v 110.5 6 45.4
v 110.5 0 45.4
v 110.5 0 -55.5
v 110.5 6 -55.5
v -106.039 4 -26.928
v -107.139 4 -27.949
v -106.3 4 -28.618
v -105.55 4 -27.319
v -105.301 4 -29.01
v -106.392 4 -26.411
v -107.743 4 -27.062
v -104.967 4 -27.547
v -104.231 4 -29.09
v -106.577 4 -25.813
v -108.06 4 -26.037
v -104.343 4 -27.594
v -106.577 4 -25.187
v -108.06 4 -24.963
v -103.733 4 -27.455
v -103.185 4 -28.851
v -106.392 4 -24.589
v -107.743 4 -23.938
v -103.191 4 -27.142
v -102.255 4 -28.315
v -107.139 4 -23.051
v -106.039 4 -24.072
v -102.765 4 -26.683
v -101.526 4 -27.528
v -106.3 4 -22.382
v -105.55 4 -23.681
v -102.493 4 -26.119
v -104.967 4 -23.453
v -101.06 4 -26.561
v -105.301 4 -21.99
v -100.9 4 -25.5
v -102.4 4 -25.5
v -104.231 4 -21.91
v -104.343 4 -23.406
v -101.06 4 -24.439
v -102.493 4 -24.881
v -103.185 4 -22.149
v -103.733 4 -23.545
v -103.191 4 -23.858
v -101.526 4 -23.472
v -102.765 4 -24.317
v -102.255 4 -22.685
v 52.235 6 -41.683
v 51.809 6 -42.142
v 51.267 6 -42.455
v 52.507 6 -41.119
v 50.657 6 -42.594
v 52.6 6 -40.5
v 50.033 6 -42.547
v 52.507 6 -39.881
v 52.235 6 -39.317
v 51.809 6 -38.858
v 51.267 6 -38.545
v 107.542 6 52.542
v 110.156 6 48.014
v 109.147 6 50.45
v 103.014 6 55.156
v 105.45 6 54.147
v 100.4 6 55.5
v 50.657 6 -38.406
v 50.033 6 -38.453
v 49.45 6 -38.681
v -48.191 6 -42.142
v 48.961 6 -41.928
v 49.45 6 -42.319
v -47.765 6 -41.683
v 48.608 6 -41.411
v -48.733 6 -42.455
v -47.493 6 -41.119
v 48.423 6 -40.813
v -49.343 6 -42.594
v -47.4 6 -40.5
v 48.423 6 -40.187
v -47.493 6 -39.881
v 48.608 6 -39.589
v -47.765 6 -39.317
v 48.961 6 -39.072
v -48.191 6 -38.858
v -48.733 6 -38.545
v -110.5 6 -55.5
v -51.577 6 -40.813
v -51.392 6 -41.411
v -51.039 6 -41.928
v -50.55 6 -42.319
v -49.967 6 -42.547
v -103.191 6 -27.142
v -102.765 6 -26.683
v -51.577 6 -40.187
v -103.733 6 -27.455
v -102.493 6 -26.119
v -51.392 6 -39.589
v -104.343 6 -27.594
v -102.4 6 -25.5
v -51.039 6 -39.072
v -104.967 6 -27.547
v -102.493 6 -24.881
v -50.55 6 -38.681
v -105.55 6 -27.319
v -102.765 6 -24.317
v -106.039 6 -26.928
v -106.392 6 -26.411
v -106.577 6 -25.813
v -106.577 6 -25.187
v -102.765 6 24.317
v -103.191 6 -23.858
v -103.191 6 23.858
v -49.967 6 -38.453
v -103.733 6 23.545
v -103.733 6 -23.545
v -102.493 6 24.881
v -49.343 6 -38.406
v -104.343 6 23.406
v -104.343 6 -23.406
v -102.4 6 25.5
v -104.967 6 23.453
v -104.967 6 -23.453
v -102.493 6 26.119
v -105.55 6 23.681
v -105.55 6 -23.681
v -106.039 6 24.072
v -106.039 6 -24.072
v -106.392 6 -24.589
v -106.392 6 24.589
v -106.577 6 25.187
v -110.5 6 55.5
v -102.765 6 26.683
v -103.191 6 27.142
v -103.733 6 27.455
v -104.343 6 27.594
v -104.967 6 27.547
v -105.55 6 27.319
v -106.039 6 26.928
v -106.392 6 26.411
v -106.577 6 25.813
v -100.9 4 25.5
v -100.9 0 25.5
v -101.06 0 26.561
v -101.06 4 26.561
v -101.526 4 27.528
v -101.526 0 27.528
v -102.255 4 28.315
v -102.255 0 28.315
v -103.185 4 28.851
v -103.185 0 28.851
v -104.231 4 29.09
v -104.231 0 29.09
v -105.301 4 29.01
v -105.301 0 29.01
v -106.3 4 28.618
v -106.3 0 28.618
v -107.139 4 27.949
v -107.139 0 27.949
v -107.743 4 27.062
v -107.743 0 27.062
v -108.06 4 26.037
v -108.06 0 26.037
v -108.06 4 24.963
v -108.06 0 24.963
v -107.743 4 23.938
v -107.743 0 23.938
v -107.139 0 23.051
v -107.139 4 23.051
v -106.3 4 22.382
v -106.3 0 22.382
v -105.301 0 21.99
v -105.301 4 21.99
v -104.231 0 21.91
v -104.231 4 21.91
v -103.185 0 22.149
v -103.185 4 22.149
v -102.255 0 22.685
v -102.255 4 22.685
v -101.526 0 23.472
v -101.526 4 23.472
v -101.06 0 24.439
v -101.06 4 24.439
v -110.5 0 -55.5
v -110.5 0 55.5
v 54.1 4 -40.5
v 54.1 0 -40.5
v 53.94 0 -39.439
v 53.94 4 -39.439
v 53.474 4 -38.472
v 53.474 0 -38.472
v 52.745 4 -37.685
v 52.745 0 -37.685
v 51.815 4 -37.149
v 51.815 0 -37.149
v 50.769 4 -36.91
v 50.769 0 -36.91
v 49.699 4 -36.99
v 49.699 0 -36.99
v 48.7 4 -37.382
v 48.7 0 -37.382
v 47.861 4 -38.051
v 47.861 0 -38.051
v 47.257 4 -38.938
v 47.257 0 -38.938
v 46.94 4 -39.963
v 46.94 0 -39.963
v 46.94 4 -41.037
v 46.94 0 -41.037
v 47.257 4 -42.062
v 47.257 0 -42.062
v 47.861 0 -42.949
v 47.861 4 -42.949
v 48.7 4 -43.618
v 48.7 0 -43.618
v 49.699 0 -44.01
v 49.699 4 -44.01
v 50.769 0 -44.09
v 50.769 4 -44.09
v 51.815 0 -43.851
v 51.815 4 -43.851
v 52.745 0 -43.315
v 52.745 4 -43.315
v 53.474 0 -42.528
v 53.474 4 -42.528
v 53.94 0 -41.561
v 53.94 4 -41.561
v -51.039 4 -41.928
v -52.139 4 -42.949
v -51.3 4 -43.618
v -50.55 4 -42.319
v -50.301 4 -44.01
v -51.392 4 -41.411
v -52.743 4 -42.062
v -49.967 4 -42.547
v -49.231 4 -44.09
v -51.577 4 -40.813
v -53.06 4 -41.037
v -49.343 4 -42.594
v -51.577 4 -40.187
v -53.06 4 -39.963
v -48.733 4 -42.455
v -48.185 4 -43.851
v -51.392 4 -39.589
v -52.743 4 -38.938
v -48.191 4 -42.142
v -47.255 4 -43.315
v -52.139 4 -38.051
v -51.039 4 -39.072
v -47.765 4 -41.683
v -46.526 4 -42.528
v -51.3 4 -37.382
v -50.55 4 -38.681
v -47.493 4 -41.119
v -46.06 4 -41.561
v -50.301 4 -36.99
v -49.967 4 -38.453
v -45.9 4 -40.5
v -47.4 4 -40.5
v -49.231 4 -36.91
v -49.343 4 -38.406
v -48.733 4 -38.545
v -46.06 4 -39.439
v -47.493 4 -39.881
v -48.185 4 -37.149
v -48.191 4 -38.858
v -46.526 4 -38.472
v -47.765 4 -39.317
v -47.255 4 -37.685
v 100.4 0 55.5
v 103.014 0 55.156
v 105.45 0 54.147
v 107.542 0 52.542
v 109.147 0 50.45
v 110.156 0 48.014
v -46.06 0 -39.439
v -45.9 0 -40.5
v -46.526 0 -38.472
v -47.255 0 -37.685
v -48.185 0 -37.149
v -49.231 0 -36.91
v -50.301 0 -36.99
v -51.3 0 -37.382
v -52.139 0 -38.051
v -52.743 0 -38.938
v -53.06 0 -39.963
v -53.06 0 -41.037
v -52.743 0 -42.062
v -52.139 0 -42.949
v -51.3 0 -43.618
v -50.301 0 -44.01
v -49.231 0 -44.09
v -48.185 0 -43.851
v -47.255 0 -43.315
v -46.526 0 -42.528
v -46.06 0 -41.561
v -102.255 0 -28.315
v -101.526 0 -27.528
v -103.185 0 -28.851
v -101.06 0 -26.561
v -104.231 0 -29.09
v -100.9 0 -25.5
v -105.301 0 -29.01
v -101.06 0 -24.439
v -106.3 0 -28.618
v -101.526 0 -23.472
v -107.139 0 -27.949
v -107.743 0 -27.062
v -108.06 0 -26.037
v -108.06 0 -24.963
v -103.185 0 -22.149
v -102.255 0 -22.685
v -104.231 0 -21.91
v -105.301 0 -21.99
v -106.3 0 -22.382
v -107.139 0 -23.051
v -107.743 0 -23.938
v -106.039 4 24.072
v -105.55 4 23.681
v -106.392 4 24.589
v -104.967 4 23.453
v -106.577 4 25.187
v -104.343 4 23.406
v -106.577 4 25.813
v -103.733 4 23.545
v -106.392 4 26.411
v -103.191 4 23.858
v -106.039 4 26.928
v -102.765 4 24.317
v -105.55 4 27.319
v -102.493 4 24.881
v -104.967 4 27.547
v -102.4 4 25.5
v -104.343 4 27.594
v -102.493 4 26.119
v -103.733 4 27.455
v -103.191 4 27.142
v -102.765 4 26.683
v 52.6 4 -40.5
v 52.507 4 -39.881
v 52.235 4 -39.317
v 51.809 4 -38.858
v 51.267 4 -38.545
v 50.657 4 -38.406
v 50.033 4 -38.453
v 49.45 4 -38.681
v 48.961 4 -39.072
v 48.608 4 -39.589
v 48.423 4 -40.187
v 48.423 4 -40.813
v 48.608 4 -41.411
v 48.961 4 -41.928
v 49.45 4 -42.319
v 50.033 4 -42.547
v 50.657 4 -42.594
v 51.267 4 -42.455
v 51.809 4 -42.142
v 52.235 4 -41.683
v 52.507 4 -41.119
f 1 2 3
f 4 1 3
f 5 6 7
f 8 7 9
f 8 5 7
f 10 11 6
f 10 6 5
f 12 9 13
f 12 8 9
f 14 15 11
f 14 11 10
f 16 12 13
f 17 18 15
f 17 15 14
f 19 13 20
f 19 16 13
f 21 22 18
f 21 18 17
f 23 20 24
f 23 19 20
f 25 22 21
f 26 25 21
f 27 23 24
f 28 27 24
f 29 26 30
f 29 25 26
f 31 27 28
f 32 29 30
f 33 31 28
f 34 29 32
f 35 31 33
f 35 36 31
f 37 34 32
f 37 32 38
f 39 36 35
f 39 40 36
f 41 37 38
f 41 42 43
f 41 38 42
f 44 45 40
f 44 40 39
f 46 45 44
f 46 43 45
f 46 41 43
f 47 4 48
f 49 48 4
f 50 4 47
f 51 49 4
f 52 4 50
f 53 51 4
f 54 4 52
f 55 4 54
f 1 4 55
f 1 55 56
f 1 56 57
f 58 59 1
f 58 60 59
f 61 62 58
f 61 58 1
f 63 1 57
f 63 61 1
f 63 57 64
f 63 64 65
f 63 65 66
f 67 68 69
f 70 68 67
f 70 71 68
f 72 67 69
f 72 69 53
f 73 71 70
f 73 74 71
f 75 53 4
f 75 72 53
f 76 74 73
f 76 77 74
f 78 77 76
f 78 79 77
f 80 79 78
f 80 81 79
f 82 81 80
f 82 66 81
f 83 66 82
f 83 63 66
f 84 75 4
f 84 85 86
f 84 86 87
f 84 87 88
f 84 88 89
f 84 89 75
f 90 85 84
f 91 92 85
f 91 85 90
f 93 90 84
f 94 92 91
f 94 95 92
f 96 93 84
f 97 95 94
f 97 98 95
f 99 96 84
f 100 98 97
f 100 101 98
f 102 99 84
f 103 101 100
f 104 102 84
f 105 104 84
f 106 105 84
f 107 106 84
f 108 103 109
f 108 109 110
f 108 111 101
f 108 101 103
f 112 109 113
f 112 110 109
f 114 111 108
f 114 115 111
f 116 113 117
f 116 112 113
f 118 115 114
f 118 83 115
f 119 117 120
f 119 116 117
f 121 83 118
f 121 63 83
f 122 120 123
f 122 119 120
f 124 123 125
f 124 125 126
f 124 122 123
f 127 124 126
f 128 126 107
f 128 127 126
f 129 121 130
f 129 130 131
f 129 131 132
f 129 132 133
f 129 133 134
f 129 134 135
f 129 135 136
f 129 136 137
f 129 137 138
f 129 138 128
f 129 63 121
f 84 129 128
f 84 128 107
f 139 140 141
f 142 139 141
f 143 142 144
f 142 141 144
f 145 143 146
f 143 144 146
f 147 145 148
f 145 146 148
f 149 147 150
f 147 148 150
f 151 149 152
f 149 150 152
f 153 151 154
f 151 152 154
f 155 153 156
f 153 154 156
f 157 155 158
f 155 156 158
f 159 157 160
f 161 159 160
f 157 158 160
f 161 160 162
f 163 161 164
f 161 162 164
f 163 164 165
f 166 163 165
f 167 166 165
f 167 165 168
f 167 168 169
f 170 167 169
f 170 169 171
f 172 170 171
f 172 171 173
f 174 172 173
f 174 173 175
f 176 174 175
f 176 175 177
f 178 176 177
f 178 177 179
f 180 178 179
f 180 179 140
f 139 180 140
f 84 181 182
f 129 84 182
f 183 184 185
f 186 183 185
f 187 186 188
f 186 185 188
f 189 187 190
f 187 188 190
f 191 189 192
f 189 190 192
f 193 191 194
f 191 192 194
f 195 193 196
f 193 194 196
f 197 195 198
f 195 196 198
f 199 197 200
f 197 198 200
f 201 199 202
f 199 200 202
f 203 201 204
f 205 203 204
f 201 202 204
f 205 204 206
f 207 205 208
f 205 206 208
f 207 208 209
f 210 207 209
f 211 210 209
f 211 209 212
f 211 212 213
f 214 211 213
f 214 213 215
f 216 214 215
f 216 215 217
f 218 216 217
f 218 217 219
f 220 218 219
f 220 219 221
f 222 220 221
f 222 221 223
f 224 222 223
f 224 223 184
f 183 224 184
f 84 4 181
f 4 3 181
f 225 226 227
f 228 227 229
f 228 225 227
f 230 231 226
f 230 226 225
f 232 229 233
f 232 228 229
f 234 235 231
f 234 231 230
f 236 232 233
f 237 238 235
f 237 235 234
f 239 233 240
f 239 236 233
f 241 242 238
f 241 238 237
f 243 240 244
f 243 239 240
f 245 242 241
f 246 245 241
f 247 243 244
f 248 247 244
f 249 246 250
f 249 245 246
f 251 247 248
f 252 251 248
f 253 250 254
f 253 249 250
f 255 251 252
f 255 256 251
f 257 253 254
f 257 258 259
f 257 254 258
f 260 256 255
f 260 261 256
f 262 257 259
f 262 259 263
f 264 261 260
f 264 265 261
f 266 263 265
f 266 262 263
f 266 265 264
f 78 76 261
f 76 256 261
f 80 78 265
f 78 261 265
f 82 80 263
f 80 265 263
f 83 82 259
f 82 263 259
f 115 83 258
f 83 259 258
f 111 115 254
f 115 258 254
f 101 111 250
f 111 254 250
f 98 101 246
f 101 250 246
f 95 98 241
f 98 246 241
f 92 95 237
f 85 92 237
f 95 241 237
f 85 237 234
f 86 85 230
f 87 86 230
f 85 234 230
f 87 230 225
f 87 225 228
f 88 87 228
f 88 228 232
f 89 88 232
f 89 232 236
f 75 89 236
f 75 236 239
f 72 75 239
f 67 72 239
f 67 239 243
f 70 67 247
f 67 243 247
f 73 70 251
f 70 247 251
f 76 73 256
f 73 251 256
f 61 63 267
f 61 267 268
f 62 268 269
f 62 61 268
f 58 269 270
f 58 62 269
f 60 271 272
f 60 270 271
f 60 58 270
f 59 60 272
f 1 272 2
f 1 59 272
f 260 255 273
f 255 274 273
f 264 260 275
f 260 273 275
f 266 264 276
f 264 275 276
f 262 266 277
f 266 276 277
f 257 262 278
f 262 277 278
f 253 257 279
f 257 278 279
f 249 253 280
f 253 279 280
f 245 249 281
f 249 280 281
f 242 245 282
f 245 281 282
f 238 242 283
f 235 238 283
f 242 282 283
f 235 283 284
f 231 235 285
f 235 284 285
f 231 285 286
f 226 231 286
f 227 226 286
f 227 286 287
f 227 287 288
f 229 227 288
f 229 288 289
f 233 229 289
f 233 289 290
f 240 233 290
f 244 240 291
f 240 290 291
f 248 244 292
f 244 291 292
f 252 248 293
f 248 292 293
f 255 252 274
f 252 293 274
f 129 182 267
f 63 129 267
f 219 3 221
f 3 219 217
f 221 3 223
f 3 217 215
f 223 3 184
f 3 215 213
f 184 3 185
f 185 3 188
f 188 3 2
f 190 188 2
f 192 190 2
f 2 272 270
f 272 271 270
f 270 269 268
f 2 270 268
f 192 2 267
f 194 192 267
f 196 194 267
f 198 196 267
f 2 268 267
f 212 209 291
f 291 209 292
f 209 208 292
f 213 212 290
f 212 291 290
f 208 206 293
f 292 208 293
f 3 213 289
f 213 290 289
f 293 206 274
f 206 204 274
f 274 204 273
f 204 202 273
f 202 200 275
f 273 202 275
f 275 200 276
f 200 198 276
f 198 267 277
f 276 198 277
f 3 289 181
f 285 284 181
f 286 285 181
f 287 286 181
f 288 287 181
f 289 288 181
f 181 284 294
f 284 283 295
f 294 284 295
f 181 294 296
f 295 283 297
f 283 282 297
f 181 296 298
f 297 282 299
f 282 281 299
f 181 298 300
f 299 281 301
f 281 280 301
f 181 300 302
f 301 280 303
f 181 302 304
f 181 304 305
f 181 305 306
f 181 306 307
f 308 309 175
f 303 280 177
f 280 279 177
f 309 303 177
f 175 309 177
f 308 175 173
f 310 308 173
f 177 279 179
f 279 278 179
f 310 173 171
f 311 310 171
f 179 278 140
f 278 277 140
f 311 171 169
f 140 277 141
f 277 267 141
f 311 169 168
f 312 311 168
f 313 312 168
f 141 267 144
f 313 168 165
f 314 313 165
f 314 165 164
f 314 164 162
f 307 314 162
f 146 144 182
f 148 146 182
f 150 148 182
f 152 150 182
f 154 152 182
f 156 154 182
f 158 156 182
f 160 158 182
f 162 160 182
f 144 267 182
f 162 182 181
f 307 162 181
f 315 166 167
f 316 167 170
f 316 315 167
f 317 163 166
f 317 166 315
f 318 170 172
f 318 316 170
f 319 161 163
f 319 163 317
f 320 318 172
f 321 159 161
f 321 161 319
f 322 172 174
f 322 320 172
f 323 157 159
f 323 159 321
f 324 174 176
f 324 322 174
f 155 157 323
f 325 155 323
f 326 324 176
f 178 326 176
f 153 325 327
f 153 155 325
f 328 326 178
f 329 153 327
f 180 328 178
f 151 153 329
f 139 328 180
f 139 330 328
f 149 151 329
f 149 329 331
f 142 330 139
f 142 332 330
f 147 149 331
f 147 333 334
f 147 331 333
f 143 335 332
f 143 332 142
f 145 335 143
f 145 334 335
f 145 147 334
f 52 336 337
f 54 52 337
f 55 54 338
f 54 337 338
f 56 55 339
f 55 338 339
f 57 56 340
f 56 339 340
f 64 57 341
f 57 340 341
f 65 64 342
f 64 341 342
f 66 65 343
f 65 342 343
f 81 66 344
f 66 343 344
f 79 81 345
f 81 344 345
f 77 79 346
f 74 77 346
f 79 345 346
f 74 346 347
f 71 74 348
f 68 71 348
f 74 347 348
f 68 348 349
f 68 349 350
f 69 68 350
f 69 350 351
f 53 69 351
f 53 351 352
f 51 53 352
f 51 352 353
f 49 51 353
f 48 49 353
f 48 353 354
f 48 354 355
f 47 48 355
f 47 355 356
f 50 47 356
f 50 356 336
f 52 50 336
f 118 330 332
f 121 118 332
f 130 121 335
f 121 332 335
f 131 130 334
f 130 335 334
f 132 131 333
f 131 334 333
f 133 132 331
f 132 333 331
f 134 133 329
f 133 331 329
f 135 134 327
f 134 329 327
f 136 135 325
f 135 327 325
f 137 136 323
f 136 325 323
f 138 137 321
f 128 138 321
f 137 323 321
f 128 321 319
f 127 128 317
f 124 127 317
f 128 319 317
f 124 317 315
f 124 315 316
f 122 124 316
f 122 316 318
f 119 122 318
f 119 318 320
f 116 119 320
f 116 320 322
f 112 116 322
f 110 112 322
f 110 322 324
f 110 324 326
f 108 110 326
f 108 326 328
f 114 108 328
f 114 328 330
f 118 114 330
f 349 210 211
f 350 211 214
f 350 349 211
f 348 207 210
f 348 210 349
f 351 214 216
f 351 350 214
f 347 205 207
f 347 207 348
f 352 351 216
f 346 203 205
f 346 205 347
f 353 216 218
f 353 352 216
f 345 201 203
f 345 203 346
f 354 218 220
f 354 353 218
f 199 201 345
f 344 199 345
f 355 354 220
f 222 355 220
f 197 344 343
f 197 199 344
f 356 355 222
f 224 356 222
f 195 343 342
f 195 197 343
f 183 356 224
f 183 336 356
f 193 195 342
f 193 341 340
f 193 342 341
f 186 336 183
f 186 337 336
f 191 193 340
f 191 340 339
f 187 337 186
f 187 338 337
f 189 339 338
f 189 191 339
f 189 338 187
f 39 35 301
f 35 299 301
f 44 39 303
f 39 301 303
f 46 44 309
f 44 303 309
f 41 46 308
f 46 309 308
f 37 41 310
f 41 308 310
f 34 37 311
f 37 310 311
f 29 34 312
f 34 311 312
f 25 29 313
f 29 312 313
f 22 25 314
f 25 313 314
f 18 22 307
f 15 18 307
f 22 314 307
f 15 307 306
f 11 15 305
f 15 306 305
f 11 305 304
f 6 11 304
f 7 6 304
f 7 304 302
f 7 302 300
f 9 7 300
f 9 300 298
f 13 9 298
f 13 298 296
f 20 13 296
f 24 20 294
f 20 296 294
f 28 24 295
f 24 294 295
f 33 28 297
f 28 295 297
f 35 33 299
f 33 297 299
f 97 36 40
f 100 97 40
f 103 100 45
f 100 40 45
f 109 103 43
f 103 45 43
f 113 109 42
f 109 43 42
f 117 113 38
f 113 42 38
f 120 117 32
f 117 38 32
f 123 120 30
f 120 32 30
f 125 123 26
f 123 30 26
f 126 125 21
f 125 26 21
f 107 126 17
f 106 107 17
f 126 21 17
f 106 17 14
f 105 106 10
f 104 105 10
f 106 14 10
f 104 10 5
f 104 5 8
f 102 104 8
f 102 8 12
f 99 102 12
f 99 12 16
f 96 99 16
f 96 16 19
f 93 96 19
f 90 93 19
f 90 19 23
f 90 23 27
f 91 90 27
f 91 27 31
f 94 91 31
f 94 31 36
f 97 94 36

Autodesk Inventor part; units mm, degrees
ref_plane "YZ Plane" through (0, 0, 0) normal (1, 0, 0) x (0, 1, 0)
ref_plane "XZ Plane" through (0, 0, 0) normal (0, 1, 0) x (-1, 0, 0)
ref_plane "XY Plane" through (0, 0, 0) normal (0, 0, 1) x (1, 0, 0)
sketch "草图1" plane through (0, 0, 0) normal (0, 1, 0) x (-1, 0, 0)
  line L0 (110.5, 55.5) -> (-110.5, 55.5)
  line L1 (-110.5, 55.5) -> (-110.5, -55.5)
  line L2 (-110.5, -55.5) -> (110.5, -55.5)
  line L3 (110.5, -55.5) -> (110.5, 55.5)
  line L4 (0, 7.5575) -> (0, -11)
  line L5 (8.5019, 0) -> (-7, 0)
  point P0 (0, 0)
  point P1 (0, 0)
  dimension "d0" = 221
  dimension "d1" = 111
extrude "拉伸1" add sketch "草图1" along normal blind 6
fillet "圆角1" radius 10.1 1 edges at (110.5, 3, 55.5)
sketch "草图2" plane through (0, 0, 0) normal (0, -1, 0) x (1, 0, 0)
  circle A0 centre (-104.5, 25.5) radius 2.1
  circle A1 centre (-104.5, -25.5) radius 2.1
  line L0 (-110.5, -55.5) -> (-110.5, 55.5) projected
  line L1 (110.5, -55.5) -> (-110.5, -55.5) projected
  line L2 (-110.5, 55.5) -> (100.4, 55.5) projected
  point P0 (0, 0)
  dimension "d5" = 4.2
  dimension "d6" = 4.2
  dimension "d7" = 6
  dimension "d8" = 6
  dimension "d9" = 30
  dimension "d10" = 30
extrude "拉伸2" cut sketch "草图2" against normal blind 6
sketch "草图3" plane through (0, 0, 0) normal (0, -1, 0) x (1, 0, 0)
  circle A0 centre (-104.5, 25.5) radius 2.1 projected
  circle A1 centre (-104.5, 25.5) radius 3.6
  circle A2 centre (-104.5, -25.5) radius 2.1 projected
  circle A3 centre (-104.5, -25.5) radius 3.6
  point P0 (0, 0)
  dimension "d13" = 7.2
  dimension "d14" = 7.2
extrude "拉伸3" cut sketch "草图3" against normal blind 4
sketch "草图4" plane through (0, 0, 0) normal (0, -1, 0) x (1, 0, 0)
  circle A0 centre (-49.5, -40.5) radius 2.1
  circle A1 centre (50.5, -40.5) radius 2.1
  line L0 (110.5, -55.5) -> (-110.5, -55.5) projected
  line L1 (110.5, 45.4) -> (110.5, -55.5) projected
  point P0 (0, 0)
  dimension "d17" = 4.2
  dimension "d18" = 4.2
  dimension "d19" = 15
  dimension "d20" = 15
  dimension "d21" = 60
  dimension "d22" = 100
extrude "拉伸4" cut sketch "草图4" against normal blind 10
sketch "草图5" plane through (0, 0, 0) normal (0, -1, 0) x (1, 0, 0)
  circle A0 centre (-49.5, -40.5) radius 2.1 projected
  circle A1 centre (-49.5, -40.5) radius 3.6
  circle A2 centre (50.5, -40.5) radius 2.1 projected
  circle A3 centre (50.5, -40.5) radius 3.6
  point P0 (0, 0)
  dimension "d25" = 7.2
  dimension "d26" = 7.2
extrude "拉伸5" cut sketch "草图5" against normal blind 4 contours A0 | A1 | A2 | A3
properties part number "底板_B"
